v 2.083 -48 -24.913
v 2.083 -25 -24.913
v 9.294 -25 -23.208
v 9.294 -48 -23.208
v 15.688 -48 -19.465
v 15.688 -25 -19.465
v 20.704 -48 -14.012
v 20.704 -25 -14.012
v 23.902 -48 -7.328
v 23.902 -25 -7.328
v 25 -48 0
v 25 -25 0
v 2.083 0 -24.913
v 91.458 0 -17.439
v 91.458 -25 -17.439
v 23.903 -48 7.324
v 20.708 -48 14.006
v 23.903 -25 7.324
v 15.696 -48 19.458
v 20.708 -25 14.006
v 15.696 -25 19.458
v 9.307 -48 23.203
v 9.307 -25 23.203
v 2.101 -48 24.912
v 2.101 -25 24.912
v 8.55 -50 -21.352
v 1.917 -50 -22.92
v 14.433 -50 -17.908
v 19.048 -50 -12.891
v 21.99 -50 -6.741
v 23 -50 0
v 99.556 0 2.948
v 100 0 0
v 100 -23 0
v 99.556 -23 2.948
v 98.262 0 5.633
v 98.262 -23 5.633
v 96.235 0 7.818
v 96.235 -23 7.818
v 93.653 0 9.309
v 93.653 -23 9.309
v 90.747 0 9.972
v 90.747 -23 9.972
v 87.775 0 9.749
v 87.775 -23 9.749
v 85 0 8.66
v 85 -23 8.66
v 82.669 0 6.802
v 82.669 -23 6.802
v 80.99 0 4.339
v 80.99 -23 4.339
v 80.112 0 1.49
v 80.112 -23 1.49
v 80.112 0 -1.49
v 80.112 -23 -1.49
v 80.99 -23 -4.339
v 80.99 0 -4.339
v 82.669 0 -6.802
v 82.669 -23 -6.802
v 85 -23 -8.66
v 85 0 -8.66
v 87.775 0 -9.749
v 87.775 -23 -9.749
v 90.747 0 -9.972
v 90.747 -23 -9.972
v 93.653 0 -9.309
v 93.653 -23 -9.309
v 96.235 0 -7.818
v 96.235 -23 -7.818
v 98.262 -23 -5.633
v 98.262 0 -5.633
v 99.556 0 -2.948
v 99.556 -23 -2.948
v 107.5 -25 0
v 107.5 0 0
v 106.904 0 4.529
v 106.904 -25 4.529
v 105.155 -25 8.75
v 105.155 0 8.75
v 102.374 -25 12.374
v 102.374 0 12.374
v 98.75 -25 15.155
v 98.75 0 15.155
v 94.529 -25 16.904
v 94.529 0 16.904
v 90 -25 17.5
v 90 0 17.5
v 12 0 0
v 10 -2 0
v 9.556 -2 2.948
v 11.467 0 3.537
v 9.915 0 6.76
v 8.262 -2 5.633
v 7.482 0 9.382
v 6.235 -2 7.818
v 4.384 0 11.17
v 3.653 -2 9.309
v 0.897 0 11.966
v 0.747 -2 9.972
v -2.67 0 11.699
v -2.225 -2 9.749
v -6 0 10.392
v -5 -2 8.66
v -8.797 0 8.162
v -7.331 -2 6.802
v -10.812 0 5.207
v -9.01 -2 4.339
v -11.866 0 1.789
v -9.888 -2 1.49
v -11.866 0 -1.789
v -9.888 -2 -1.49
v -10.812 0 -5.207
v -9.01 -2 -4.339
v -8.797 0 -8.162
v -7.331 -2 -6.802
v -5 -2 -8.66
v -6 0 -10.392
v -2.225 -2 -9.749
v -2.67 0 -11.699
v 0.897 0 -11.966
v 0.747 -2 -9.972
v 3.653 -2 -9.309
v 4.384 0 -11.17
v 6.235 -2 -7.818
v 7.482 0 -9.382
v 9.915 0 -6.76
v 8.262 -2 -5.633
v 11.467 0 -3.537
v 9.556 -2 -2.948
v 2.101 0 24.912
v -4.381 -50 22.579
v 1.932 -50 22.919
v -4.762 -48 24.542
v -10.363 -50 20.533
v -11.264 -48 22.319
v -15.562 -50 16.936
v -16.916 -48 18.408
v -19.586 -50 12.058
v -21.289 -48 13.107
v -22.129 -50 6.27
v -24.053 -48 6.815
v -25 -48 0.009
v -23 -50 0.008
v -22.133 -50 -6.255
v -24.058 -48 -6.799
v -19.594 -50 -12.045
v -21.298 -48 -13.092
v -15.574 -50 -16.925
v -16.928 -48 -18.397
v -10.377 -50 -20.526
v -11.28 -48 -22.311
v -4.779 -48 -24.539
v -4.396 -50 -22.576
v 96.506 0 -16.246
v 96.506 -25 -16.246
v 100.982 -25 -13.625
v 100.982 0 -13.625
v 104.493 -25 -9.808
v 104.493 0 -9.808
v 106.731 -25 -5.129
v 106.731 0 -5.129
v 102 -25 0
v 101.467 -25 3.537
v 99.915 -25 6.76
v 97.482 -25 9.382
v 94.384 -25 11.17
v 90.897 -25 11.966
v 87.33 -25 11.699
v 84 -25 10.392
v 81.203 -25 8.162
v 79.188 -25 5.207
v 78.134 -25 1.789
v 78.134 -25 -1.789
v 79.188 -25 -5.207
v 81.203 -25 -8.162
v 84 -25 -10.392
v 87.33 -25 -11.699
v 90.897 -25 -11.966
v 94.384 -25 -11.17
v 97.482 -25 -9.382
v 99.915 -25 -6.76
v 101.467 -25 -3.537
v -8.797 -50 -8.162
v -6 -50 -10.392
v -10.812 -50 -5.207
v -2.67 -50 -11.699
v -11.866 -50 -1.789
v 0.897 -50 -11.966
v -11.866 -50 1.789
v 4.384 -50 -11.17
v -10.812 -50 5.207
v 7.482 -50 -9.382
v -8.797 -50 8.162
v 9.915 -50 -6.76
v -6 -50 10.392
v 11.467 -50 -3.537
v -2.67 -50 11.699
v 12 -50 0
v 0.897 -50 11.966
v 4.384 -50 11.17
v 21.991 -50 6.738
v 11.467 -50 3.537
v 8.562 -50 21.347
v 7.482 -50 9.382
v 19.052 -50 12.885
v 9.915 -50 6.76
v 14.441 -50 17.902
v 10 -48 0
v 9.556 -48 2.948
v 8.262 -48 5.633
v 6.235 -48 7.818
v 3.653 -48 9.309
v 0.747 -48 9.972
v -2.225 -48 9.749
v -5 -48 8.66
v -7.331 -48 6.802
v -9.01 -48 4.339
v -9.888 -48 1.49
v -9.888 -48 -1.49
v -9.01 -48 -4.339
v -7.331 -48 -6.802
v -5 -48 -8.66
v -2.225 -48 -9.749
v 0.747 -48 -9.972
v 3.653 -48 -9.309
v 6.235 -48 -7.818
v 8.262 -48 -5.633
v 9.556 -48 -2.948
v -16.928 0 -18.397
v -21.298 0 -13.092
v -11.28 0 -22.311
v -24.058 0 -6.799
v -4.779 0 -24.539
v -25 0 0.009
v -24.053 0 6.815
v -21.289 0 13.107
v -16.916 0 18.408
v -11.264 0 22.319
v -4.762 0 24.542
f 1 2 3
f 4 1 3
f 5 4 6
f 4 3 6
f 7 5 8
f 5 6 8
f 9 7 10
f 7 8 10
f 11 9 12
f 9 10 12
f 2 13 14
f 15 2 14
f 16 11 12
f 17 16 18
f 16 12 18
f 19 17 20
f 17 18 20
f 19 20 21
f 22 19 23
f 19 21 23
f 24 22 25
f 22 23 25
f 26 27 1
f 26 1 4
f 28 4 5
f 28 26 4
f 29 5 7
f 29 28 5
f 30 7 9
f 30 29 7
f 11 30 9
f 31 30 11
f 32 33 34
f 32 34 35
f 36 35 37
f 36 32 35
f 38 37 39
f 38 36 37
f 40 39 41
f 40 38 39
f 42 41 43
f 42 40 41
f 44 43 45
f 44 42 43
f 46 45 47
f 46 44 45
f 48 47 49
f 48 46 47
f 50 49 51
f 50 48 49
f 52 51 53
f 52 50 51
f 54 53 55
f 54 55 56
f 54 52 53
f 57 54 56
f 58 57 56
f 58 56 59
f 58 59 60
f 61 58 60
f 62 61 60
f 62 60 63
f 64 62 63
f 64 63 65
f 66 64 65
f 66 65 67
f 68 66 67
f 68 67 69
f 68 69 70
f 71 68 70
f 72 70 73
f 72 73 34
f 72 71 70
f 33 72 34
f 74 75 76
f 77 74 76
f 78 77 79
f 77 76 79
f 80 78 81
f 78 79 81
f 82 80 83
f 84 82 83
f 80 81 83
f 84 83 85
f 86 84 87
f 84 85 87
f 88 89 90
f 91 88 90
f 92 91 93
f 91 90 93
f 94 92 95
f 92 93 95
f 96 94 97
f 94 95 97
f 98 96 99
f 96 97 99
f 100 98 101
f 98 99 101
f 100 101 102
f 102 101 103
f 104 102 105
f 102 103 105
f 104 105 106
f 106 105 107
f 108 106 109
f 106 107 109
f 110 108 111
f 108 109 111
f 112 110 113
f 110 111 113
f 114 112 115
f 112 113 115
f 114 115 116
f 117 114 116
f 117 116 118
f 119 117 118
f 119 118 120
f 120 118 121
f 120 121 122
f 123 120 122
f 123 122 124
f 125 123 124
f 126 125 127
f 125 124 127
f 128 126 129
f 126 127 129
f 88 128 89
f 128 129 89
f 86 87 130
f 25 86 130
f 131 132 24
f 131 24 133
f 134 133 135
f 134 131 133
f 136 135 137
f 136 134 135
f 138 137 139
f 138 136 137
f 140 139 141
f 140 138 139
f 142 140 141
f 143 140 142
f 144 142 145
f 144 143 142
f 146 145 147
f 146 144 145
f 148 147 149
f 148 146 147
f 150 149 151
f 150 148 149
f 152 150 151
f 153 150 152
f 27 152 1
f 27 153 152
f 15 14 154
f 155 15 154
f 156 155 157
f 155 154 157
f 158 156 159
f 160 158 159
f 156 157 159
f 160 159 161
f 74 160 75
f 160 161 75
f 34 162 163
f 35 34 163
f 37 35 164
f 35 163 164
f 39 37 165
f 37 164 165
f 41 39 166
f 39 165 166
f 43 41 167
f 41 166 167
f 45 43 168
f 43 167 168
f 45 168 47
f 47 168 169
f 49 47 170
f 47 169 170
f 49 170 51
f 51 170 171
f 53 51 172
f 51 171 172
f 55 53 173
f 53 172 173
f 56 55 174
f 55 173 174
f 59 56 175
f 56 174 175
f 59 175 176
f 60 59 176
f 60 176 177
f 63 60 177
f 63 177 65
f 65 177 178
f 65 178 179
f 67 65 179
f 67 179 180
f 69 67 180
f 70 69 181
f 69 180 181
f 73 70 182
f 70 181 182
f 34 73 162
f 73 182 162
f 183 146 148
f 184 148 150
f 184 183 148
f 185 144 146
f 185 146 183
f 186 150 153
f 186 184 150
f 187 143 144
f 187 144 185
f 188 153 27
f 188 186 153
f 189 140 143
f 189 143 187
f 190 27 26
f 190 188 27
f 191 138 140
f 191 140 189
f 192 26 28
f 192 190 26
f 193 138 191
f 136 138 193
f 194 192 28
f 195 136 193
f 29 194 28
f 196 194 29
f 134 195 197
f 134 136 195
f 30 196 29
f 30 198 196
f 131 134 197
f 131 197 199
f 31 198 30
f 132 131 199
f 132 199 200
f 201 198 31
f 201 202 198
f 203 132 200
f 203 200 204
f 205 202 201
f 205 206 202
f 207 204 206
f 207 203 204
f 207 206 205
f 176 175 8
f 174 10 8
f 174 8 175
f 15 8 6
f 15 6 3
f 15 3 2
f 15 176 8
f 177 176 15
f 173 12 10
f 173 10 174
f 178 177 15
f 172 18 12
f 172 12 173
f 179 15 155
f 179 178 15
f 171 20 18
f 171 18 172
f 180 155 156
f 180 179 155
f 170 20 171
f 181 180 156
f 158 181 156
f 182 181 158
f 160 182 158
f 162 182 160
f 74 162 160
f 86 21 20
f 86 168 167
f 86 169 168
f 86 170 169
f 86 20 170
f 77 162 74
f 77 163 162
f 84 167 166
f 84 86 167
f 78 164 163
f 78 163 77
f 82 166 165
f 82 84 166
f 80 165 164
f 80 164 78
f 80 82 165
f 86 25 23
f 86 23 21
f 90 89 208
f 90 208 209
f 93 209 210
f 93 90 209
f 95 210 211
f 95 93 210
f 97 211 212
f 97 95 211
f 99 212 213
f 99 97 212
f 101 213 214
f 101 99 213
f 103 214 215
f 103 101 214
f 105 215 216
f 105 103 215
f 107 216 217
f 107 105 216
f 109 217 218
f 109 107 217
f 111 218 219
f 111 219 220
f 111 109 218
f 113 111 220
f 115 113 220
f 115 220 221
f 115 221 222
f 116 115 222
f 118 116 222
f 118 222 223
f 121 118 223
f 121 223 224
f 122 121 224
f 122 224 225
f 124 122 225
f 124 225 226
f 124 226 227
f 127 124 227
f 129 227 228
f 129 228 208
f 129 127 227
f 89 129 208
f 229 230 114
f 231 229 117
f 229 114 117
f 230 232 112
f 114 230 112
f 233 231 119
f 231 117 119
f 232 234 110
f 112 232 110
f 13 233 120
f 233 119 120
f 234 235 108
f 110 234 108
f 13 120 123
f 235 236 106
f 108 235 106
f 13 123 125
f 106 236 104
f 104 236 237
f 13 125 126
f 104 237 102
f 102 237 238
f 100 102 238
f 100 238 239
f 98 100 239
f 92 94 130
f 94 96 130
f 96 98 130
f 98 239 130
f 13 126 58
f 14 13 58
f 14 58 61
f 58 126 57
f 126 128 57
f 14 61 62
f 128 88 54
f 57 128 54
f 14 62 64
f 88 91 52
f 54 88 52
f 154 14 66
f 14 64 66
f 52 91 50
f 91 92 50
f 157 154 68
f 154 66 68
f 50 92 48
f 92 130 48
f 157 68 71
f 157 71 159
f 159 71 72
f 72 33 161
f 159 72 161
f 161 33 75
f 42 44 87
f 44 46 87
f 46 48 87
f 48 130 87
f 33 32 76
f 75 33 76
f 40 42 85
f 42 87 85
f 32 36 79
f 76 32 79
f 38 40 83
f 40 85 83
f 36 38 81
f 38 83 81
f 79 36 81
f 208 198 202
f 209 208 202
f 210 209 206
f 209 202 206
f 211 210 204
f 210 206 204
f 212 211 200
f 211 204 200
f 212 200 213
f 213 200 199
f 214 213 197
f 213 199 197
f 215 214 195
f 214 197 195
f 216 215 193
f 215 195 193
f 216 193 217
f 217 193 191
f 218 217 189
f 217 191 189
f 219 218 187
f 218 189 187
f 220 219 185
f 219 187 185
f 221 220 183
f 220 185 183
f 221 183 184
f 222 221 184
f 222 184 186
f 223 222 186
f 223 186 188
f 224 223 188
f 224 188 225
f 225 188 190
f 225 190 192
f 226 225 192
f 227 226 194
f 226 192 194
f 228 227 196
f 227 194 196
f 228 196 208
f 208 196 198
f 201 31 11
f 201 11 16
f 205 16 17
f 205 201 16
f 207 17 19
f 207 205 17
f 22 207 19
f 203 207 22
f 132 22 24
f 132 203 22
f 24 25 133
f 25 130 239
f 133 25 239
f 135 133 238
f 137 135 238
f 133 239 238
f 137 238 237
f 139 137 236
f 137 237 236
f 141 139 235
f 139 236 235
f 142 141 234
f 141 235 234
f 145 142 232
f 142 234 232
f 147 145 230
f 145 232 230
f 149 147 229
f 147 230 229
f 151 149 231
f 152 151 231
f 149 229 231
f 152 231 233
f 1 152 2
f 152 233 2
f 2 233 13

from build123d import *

# Parameters (mm, degrees)
F0_R     = 10
F1_DEPTH = 25
F2_DEPTH = 50
F3_SIZE  = 2


with BuildPart() as f1:
    # F0 (on Front) → F1 (new body)
    with BuildSketch(Plane.XZ):
        with BuildLine():
            ThreePointArc((2.083333, -24.913043), (18.399502, -16.92508), (25, 0))
            ThreePointArc((25, 0), (18.40534, 16.918731), (2.100522, 24.9116))
            ThreePointArc((2.100522, 24.9116), (-24.999999, 0.008625), (2.083333, -24.913043))
        make_face()
        Circle(F0_R, mode=Mode.SUBTRACT)
        with BuildLine():
            ThreePointArc((2.100522, 24.9116), (18.40534, 16.918731), (25, 0))
            ThreePointArc((25, 0), (18.399502, -16.92508), (2.083333, -24.913043))
            Line((2.083333, -24.913043), (91.458333, -17.43913))
            ThreePointArc((91.458333, -17.43913), (72.515224, -0.729802), (90, 17.5))
            Line((90, 17.5), (2.100522, 24.9116))
        make_face()
        with BuildLine():
            ThreePointArc((107.5, 0), (102.374369, 12.374369), (90, 17.5))
            ThreePointArc((90, 17.5), (72.515224, -0.729802), (91.458333, -17.43913))
            ThreePointArc((91.458333, -17.43913), (102.879651, -11.847556), (107.5, 0))
        make_face()
        with Locations((90, 0)):
            Circle(F0_R, mode=Mode.SUBTRACT)
    extrude(amount=F1_DEPTH)

    # F0 (on Front) → F2 (join)
    with BuildSketch(Plane.XZ):
        with BuildLine():
            ThreePointArc((2.083333, -24.913043), (18.399502, -16.92508), (25, 0))
            ThreePointArc((25, 0), (18.40534, 16.918731), (2.100522, 24.9116))
            ThreePointArc((2.100522, 24.9116), (-24.999999, 0.008625), (2.083333, -24.913043))
        make_face()
        Circle(F0_R, mode=Mode.SUBTRACT)
    extrude(amount=F2_DEPTH)

    # F3
    f3_edges = [f1.edges().sort_by_distance(p)[0] for p in [
        (-10, 0, 0),
        (10, -25, 0),
        (-10, -50, 0),
        (-2.083333, -50, 24.913043),
        (80, -25, 0),
    ]]
    chamfer(f3_edges, length=F3_SIZE)


solid = f1.part
